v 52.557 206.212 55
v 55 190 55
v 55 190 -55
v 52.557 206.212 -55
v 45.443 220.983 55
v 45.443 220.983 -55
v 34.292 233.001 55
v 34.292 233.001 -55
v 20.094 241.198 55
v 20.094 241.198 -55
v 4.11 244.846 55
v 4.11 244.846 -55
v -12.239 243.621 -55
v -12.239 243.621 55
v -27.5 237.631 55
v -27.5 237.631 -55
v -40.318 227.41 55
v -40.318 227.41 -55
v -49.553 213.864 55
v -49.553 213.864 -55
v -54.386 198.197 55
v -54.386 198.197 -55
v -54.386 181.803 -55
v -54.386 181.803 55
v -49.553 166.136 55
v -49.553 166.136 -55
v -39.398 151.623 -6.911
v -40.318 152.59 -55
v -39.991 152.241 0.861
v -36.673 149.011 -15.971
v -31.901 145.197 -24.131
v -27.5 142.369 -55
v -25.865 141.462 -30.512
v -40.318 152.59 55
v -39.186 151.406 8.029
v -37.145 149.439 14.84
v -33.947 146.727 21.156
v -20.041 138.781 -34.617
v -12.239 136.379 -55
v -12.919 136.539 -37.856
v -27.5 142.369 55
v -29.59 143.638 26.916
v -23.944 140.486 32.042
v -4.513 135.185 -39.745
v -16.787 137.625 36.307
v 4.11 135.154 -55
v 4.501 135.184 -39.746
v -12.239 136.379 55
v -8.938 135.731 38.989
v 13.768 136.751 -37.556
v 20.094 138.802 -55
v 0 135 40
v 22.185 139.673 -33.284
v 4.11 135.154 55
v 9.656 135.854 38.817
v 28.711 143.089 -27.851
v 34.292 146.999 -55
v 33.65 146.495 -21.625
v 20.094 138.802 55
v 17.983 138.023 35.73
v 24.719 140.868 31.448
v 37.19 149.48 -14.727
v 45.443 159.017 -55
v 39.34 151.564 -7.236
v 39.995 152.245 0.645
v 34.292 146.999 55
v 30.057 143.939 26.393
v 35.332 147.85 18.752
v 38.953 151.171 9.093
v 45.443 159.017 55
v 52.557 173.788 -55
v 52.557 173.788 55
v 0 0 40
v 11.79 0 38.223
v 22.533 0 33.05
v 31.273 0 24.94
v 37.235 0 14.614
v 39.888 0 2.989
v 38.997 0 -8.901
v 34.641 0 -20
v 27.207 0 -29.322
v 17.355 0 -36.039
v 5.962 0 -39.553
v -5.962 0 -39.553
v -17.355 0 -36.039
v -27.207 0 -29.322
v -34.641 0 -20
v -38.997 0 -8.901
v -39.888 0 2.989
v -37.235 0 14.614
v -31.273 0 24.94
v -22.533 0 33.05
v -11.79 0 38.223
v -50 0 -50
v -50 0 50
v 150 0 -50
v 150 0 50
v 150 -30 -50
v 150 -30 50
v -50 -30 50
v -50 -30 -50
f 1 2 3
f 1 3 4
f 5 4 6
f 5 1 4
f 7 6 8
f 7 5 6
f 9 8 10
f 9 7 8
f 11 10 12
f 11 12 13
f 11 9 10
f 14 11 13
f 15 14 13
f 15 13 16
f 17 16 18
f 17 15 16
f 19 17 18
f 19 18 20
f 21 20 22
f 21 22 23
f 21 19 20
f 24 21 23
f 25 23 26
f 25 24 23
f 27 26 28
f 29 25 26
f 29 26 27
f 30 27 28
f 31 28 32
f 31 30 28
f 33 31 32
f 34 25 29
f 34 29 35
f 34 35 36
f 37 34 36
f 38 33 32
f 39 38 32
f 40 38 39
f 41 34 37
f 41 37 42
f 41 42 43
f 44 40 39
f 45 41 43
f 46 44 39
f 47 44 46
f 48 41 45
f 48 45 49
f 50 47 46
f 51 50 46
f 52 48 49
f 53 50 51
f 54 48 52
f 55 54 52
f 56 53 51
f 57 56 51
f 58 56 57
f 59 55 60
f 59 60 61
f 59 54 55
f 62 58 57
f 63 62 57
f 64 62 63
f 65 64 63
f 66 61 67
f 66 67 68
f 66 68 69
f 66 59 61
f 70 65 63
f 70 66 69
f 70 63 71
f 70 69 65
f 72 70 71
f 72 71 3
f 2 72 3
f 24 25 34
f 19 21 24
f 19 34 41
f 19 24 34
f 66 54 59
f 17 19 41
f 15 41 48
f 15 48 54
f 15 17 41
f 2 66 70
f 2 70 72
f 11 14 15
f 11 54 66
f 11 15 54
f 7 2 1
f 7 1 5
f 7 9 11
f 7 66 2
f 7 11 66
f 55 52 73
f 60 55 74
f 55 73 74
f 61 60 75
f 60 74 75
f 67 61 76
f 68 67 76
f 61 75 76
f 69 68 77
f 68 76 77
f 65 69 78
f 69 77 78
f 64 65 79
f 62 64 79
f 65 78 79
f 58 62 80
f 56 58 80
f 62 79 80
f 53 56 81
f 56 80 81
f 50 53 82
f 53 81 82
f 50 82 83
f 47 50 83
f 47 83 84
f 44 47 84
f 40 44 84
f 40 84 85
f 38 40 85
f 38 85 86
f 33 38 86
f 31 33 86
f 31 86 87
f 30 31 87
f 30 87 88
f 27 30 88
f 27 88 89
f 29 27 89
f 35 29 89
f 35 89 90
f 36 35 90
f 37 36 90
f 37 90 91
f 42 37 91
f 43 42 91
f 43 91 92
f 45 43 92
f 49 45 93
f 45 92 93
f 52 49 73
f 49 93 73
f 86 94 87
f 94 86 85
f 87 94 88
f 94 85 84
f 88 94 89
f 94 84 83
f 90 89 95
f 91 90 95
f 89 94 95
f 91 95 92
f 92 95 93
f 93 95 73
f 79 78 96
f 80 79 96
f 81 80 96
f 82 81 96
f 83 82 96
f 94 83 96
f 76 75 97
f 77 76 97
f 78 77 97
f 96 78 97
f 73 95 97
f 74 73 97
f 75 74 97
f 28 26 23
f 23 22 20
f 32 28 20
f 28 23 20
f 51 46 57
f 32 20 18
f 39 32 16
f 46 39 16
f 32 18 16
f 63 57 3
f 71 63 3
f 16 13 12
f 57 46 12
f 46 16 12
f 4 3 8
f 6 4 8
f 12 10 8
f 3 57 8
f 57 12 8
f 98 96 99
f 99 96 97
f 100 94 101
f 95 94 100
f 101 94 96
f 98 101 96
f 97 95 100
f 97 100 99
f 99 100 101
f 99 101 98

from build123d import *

# Parameters (mm, degrees)
SKETCH1_R           = 40
BOSS_EXTRUDE1_DEPTH = 190
SKETCH2_R           = 55
BOSS_EXTRUDE2_DEPTH = 55
SKETCH3_W           = 200
SKETCH3_H           = 100
BOSS_EXTRUDE3_DEPTH = 30


with BuildPart() as part:
    # Sketch1 → Boss-Extrude1 (new body)
    with BuildSketch(Plane(origin=(0, 0, 0), x_dir=(1, 0, 0), z_dir=(0, 1, 0))):
        Circle(SKETCH1_R)
    extrude(amount=BOSS_EXTRUDE1_DEPTH)

    # Sketch2 → Boss-Extrude2 (add, symmetric)
    with BuildSketch(Plane.XY):
        with Locations((0, 190)):
            Circle(SKETCH2_R)
    extrude(amount=BOSS_EXTRUDE2_DEPTH, both=True)

    # Sketch3 → Boss-Extrude3 (add)
    with BuildSketch(Plane.XZ):
        with Locations((50, 0)):
            Rectangle(SKETCH3_W, SKETCH3_H)
    extrude(amount=BOSS_EXTRUDE3_DEPTH)


solid = part.part
